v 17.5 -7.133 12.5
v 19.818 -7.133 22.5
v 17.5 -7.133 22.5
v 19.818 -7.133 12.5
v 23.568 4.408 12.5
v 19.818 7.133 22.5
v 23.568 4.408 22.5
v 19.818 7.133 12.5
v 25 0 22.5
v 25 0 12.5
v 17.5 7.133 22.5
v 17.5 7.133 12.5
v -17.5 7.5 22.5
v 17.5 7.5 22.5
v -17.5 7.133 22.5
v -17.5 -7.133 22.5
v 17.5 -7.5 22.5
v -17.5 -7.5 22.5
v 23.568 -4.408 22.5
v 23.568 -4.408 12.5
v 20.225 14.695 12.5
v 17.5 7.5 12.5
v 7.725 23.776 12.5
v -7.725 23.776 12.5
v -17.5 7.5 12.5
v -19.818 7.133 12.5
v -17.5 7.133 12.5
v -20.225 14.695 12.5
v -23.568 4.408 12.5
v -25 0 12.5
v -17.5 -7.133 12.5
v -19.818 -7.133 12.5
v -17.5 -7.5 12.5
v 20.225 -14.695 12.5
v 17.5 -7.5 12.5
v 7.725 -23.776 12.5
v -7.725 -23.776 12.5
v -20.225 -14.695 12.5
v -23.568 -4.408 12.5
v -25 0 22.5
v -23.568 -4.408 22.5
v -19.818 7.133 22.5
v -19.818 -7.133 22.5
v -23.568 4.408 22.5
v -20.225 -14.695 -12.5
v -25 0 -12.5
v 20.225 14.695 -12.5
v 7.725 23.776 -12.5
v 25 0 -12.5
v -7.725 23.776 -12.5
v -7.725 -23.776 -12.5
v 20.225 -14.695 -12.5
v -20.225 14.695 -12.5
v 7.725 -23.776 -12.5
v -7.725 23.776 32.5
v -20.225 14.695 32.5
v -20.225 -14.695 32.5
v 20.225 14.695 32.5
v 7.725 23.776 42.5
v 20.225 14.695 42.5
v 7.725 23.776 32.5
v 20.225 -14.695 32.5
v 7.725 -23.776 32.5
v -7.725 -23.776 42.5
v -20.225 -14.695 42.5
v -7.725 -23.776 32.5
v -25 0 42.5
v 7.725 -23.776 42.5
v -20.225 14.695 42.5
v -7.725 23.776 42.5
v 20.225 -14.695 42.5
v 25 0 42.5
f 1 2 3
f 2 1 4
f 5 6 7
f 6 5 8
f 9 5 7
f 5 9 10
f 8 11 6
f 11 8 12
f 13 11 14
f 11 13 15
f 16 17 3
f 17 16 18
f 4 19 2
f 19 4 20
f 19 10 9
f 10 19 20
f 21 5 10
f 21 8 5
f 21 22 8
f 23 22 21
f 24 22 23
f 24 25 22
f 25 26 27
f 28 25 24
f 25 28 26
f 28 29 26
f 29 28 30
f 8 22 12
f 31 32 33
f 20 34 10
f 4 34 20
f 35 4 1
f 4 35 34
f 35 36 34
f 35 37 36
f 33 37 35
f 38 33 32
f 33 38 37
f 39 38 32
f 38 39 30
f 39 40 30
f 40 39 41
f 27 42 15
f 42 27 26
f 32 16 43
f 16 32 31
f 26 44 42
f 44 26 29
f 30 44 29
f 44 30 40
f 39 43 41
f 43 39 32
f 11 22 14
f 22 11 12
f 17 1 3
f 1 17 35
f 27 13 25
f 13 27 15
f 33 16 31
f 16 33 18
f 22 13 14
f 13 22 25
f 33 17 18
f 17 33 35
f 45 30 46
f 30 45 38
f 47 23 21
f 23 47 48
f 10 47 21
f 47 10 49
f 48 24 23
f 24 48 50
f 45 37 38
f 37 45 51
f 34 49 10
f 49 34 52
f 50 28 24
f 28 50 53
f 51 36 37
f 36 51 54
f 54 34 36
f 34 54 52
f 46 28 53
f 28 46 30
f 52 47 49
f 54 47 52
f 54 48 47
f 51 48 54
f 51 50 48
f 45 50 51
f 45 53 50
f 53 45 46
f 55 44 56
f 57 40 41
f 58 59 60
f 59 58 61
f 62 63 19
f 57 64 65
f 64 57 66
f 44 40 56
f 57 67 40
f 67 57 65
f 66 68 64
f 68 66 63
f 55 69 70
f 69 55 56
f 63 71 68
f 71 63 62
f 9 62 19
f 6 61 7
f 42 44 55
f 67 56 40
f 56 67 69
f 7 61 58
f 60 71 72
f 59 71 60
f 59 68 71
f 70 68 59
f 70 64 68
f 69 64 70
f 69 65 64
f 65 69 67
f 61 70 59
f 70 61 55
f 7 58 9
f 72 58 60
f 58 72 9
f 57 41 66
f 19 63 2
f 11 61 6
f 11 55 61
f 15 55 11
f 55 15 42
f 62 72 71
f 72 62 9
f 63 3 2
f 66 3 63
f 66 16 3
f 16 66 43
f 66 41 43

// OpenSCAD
//roundcorner = true;
roundcorner = false;

$fn = roundcorner ? 100 : 10;

//roller_main_shaft_length = 110;
roller_main_shaft_length = 25;
roller_diameter = 50;

hanger_slot_span = 15;
hanger_slot_span_slop = 0.0;

hanger_slot_width = 10;
hanger_slot_width_slop = 0.0;

cap_height = 10;

roundcorner_adjustment = roundcorner ? 5 : 0;


minkowski() {
    union () {

        //main roller
        cylinder(h = roller_main_shaft_length - roundcorner_adjustment, d = roller_diameter - roundcorner_adjustment, center = true);

        //hanger slot bar
        translate([0, 0, (roller_main_shaft_length + hanger_slot_width) / 2]) {
            translate([ ((roller_diameter - hanger_slot_span + hanger_slot_span_slop) / 2), 0, 0]) {
                cylinder(h = hanger_slot_width + hanger_slot_width_slop + roundcorner_adjustment, d = hanger_slot_span - roundcorner_adjustment - hanger_slot_span_slop, center = true);
            }
            translate([-((roller_diameter - hanger_slot_span + hanger_slot_span_slop) / 2), 0, 0]) {
                cylinder(h = hanger_slot_width + hanger_slot_width_slop + roundcorner_adjustment, d = hanger_slot_span - roundcorner_adjustment - hanger_slot_span_slop, center = true);
            }
            cube([roller_diameter - (hanger_slot_span - hanger_slot_span_slop), hanger_slot_span - roundcorner_adjustment - hanger_slot_span_slop, hanger_slot_width  + roundcorner_adjustment], center = true);
        }

        //cap
        translate([0, 0, (roller_main_shaft_length / 2) + (hanger_slot_width * 1.5) ]) {
            hull () {
                translate([((roller_diameter - hanger_slot_span + hanger_slot_span_slop) / 2), 0, 0]) {
                    cylinder(h = hanger_slot_width + hanger_slot_width_slop - (roundcorner_adjustment / 2), d = hanger_slot_span  - roundcorner_adjustment - hanger_slot_span_slop, center = true);
                }
                translate([-((roller_diameter - hanger_slot_span + hanger_slot_span_slop) / 2), 0, 0]) {
                    cylinder(h = hanger_slot_width + hanger_slot_width_slop - (roundcorner_adjustment / 2), d = hanger_slot_span  - roundcorner_adjustment - hanger_slot_span_slop, center = true);
                }
            
                translate([0, 0, hanger_slot_width]) {
                    cylinder(h = hanger_slot_width + hanger_slot_width_slop - roundcorner_adjustment, d = roller_diameter - roundcorner_adjustment, center = true);
                }
            }
        }

    }

    if (roundcorner) {
        sphere(d=roundcorner_adjustment);
    }
}


/*
translate([10,0,-50]) color("red") minkowski() {
    union () {

        //main roller
        cylinder(h = roller_main_shaft_length, d = roller_diameter, center = true);

        //hanger slot bar
        translate([0, 0, (roller_main_shaft_length + hanger_slot_width) / 2]) {
            translate([ ((roller_diameter - hanger_slot_span + hanger_slot_span_slop) / 2), 0, 0]) {
                cylinder(h = hanger_slot_width + hanger_slot_width_slop, d = hanger_slot_span - hanger_slot_span_slop, center = true);
            }
            translate([-((roller_diameter - hanger_slot_span + hanger_slot_span_slop) / 2), 0, 0]) {
                cylinder(h = hanger_slot_width + hanger_slot_width_slop, d = hanger_slot_span - hanger_slot_span_slop, center = true);
            }
            cube([roller_diameter - (hanger_slot_span - hanger_slot_span_slop), hanger_slot_span - hanger_slot_span_slop, hanger_slot_width], center = true);
        }

        //cap
        translate([0, 0, (roller_main_shaft_length / 2) + (hanger_slot_width * 1.5) ]) {
            hull () {
                translate([((roller_diameter - hanger_slot_span + hanger_slot_span_slop) / 2), 0, 0]) {
                    cylinder(h = hanger_slot_width + hanger_slot_width_slop, d = hanger_slot_span - hanger_slot_span_slop, center = true);
                }
                translate([-((roller_diameter - hanger_slot_span + hanger_slot_span_slop) / 2), 0, 0]) {
                    cylinder(h = hanger_slot_width + hanger_slot_width_slop, d = hanger_slot_span - hanger_slot_span_slop, center = true);
                }
                translate([0, 0, hanger_slot_width]) {
                    cylinder(h = hanger_slot_width + hanger_slot_width_slop, d = roller_diameter, center = true);
                }
            }
        }
        
    }


}
*/
